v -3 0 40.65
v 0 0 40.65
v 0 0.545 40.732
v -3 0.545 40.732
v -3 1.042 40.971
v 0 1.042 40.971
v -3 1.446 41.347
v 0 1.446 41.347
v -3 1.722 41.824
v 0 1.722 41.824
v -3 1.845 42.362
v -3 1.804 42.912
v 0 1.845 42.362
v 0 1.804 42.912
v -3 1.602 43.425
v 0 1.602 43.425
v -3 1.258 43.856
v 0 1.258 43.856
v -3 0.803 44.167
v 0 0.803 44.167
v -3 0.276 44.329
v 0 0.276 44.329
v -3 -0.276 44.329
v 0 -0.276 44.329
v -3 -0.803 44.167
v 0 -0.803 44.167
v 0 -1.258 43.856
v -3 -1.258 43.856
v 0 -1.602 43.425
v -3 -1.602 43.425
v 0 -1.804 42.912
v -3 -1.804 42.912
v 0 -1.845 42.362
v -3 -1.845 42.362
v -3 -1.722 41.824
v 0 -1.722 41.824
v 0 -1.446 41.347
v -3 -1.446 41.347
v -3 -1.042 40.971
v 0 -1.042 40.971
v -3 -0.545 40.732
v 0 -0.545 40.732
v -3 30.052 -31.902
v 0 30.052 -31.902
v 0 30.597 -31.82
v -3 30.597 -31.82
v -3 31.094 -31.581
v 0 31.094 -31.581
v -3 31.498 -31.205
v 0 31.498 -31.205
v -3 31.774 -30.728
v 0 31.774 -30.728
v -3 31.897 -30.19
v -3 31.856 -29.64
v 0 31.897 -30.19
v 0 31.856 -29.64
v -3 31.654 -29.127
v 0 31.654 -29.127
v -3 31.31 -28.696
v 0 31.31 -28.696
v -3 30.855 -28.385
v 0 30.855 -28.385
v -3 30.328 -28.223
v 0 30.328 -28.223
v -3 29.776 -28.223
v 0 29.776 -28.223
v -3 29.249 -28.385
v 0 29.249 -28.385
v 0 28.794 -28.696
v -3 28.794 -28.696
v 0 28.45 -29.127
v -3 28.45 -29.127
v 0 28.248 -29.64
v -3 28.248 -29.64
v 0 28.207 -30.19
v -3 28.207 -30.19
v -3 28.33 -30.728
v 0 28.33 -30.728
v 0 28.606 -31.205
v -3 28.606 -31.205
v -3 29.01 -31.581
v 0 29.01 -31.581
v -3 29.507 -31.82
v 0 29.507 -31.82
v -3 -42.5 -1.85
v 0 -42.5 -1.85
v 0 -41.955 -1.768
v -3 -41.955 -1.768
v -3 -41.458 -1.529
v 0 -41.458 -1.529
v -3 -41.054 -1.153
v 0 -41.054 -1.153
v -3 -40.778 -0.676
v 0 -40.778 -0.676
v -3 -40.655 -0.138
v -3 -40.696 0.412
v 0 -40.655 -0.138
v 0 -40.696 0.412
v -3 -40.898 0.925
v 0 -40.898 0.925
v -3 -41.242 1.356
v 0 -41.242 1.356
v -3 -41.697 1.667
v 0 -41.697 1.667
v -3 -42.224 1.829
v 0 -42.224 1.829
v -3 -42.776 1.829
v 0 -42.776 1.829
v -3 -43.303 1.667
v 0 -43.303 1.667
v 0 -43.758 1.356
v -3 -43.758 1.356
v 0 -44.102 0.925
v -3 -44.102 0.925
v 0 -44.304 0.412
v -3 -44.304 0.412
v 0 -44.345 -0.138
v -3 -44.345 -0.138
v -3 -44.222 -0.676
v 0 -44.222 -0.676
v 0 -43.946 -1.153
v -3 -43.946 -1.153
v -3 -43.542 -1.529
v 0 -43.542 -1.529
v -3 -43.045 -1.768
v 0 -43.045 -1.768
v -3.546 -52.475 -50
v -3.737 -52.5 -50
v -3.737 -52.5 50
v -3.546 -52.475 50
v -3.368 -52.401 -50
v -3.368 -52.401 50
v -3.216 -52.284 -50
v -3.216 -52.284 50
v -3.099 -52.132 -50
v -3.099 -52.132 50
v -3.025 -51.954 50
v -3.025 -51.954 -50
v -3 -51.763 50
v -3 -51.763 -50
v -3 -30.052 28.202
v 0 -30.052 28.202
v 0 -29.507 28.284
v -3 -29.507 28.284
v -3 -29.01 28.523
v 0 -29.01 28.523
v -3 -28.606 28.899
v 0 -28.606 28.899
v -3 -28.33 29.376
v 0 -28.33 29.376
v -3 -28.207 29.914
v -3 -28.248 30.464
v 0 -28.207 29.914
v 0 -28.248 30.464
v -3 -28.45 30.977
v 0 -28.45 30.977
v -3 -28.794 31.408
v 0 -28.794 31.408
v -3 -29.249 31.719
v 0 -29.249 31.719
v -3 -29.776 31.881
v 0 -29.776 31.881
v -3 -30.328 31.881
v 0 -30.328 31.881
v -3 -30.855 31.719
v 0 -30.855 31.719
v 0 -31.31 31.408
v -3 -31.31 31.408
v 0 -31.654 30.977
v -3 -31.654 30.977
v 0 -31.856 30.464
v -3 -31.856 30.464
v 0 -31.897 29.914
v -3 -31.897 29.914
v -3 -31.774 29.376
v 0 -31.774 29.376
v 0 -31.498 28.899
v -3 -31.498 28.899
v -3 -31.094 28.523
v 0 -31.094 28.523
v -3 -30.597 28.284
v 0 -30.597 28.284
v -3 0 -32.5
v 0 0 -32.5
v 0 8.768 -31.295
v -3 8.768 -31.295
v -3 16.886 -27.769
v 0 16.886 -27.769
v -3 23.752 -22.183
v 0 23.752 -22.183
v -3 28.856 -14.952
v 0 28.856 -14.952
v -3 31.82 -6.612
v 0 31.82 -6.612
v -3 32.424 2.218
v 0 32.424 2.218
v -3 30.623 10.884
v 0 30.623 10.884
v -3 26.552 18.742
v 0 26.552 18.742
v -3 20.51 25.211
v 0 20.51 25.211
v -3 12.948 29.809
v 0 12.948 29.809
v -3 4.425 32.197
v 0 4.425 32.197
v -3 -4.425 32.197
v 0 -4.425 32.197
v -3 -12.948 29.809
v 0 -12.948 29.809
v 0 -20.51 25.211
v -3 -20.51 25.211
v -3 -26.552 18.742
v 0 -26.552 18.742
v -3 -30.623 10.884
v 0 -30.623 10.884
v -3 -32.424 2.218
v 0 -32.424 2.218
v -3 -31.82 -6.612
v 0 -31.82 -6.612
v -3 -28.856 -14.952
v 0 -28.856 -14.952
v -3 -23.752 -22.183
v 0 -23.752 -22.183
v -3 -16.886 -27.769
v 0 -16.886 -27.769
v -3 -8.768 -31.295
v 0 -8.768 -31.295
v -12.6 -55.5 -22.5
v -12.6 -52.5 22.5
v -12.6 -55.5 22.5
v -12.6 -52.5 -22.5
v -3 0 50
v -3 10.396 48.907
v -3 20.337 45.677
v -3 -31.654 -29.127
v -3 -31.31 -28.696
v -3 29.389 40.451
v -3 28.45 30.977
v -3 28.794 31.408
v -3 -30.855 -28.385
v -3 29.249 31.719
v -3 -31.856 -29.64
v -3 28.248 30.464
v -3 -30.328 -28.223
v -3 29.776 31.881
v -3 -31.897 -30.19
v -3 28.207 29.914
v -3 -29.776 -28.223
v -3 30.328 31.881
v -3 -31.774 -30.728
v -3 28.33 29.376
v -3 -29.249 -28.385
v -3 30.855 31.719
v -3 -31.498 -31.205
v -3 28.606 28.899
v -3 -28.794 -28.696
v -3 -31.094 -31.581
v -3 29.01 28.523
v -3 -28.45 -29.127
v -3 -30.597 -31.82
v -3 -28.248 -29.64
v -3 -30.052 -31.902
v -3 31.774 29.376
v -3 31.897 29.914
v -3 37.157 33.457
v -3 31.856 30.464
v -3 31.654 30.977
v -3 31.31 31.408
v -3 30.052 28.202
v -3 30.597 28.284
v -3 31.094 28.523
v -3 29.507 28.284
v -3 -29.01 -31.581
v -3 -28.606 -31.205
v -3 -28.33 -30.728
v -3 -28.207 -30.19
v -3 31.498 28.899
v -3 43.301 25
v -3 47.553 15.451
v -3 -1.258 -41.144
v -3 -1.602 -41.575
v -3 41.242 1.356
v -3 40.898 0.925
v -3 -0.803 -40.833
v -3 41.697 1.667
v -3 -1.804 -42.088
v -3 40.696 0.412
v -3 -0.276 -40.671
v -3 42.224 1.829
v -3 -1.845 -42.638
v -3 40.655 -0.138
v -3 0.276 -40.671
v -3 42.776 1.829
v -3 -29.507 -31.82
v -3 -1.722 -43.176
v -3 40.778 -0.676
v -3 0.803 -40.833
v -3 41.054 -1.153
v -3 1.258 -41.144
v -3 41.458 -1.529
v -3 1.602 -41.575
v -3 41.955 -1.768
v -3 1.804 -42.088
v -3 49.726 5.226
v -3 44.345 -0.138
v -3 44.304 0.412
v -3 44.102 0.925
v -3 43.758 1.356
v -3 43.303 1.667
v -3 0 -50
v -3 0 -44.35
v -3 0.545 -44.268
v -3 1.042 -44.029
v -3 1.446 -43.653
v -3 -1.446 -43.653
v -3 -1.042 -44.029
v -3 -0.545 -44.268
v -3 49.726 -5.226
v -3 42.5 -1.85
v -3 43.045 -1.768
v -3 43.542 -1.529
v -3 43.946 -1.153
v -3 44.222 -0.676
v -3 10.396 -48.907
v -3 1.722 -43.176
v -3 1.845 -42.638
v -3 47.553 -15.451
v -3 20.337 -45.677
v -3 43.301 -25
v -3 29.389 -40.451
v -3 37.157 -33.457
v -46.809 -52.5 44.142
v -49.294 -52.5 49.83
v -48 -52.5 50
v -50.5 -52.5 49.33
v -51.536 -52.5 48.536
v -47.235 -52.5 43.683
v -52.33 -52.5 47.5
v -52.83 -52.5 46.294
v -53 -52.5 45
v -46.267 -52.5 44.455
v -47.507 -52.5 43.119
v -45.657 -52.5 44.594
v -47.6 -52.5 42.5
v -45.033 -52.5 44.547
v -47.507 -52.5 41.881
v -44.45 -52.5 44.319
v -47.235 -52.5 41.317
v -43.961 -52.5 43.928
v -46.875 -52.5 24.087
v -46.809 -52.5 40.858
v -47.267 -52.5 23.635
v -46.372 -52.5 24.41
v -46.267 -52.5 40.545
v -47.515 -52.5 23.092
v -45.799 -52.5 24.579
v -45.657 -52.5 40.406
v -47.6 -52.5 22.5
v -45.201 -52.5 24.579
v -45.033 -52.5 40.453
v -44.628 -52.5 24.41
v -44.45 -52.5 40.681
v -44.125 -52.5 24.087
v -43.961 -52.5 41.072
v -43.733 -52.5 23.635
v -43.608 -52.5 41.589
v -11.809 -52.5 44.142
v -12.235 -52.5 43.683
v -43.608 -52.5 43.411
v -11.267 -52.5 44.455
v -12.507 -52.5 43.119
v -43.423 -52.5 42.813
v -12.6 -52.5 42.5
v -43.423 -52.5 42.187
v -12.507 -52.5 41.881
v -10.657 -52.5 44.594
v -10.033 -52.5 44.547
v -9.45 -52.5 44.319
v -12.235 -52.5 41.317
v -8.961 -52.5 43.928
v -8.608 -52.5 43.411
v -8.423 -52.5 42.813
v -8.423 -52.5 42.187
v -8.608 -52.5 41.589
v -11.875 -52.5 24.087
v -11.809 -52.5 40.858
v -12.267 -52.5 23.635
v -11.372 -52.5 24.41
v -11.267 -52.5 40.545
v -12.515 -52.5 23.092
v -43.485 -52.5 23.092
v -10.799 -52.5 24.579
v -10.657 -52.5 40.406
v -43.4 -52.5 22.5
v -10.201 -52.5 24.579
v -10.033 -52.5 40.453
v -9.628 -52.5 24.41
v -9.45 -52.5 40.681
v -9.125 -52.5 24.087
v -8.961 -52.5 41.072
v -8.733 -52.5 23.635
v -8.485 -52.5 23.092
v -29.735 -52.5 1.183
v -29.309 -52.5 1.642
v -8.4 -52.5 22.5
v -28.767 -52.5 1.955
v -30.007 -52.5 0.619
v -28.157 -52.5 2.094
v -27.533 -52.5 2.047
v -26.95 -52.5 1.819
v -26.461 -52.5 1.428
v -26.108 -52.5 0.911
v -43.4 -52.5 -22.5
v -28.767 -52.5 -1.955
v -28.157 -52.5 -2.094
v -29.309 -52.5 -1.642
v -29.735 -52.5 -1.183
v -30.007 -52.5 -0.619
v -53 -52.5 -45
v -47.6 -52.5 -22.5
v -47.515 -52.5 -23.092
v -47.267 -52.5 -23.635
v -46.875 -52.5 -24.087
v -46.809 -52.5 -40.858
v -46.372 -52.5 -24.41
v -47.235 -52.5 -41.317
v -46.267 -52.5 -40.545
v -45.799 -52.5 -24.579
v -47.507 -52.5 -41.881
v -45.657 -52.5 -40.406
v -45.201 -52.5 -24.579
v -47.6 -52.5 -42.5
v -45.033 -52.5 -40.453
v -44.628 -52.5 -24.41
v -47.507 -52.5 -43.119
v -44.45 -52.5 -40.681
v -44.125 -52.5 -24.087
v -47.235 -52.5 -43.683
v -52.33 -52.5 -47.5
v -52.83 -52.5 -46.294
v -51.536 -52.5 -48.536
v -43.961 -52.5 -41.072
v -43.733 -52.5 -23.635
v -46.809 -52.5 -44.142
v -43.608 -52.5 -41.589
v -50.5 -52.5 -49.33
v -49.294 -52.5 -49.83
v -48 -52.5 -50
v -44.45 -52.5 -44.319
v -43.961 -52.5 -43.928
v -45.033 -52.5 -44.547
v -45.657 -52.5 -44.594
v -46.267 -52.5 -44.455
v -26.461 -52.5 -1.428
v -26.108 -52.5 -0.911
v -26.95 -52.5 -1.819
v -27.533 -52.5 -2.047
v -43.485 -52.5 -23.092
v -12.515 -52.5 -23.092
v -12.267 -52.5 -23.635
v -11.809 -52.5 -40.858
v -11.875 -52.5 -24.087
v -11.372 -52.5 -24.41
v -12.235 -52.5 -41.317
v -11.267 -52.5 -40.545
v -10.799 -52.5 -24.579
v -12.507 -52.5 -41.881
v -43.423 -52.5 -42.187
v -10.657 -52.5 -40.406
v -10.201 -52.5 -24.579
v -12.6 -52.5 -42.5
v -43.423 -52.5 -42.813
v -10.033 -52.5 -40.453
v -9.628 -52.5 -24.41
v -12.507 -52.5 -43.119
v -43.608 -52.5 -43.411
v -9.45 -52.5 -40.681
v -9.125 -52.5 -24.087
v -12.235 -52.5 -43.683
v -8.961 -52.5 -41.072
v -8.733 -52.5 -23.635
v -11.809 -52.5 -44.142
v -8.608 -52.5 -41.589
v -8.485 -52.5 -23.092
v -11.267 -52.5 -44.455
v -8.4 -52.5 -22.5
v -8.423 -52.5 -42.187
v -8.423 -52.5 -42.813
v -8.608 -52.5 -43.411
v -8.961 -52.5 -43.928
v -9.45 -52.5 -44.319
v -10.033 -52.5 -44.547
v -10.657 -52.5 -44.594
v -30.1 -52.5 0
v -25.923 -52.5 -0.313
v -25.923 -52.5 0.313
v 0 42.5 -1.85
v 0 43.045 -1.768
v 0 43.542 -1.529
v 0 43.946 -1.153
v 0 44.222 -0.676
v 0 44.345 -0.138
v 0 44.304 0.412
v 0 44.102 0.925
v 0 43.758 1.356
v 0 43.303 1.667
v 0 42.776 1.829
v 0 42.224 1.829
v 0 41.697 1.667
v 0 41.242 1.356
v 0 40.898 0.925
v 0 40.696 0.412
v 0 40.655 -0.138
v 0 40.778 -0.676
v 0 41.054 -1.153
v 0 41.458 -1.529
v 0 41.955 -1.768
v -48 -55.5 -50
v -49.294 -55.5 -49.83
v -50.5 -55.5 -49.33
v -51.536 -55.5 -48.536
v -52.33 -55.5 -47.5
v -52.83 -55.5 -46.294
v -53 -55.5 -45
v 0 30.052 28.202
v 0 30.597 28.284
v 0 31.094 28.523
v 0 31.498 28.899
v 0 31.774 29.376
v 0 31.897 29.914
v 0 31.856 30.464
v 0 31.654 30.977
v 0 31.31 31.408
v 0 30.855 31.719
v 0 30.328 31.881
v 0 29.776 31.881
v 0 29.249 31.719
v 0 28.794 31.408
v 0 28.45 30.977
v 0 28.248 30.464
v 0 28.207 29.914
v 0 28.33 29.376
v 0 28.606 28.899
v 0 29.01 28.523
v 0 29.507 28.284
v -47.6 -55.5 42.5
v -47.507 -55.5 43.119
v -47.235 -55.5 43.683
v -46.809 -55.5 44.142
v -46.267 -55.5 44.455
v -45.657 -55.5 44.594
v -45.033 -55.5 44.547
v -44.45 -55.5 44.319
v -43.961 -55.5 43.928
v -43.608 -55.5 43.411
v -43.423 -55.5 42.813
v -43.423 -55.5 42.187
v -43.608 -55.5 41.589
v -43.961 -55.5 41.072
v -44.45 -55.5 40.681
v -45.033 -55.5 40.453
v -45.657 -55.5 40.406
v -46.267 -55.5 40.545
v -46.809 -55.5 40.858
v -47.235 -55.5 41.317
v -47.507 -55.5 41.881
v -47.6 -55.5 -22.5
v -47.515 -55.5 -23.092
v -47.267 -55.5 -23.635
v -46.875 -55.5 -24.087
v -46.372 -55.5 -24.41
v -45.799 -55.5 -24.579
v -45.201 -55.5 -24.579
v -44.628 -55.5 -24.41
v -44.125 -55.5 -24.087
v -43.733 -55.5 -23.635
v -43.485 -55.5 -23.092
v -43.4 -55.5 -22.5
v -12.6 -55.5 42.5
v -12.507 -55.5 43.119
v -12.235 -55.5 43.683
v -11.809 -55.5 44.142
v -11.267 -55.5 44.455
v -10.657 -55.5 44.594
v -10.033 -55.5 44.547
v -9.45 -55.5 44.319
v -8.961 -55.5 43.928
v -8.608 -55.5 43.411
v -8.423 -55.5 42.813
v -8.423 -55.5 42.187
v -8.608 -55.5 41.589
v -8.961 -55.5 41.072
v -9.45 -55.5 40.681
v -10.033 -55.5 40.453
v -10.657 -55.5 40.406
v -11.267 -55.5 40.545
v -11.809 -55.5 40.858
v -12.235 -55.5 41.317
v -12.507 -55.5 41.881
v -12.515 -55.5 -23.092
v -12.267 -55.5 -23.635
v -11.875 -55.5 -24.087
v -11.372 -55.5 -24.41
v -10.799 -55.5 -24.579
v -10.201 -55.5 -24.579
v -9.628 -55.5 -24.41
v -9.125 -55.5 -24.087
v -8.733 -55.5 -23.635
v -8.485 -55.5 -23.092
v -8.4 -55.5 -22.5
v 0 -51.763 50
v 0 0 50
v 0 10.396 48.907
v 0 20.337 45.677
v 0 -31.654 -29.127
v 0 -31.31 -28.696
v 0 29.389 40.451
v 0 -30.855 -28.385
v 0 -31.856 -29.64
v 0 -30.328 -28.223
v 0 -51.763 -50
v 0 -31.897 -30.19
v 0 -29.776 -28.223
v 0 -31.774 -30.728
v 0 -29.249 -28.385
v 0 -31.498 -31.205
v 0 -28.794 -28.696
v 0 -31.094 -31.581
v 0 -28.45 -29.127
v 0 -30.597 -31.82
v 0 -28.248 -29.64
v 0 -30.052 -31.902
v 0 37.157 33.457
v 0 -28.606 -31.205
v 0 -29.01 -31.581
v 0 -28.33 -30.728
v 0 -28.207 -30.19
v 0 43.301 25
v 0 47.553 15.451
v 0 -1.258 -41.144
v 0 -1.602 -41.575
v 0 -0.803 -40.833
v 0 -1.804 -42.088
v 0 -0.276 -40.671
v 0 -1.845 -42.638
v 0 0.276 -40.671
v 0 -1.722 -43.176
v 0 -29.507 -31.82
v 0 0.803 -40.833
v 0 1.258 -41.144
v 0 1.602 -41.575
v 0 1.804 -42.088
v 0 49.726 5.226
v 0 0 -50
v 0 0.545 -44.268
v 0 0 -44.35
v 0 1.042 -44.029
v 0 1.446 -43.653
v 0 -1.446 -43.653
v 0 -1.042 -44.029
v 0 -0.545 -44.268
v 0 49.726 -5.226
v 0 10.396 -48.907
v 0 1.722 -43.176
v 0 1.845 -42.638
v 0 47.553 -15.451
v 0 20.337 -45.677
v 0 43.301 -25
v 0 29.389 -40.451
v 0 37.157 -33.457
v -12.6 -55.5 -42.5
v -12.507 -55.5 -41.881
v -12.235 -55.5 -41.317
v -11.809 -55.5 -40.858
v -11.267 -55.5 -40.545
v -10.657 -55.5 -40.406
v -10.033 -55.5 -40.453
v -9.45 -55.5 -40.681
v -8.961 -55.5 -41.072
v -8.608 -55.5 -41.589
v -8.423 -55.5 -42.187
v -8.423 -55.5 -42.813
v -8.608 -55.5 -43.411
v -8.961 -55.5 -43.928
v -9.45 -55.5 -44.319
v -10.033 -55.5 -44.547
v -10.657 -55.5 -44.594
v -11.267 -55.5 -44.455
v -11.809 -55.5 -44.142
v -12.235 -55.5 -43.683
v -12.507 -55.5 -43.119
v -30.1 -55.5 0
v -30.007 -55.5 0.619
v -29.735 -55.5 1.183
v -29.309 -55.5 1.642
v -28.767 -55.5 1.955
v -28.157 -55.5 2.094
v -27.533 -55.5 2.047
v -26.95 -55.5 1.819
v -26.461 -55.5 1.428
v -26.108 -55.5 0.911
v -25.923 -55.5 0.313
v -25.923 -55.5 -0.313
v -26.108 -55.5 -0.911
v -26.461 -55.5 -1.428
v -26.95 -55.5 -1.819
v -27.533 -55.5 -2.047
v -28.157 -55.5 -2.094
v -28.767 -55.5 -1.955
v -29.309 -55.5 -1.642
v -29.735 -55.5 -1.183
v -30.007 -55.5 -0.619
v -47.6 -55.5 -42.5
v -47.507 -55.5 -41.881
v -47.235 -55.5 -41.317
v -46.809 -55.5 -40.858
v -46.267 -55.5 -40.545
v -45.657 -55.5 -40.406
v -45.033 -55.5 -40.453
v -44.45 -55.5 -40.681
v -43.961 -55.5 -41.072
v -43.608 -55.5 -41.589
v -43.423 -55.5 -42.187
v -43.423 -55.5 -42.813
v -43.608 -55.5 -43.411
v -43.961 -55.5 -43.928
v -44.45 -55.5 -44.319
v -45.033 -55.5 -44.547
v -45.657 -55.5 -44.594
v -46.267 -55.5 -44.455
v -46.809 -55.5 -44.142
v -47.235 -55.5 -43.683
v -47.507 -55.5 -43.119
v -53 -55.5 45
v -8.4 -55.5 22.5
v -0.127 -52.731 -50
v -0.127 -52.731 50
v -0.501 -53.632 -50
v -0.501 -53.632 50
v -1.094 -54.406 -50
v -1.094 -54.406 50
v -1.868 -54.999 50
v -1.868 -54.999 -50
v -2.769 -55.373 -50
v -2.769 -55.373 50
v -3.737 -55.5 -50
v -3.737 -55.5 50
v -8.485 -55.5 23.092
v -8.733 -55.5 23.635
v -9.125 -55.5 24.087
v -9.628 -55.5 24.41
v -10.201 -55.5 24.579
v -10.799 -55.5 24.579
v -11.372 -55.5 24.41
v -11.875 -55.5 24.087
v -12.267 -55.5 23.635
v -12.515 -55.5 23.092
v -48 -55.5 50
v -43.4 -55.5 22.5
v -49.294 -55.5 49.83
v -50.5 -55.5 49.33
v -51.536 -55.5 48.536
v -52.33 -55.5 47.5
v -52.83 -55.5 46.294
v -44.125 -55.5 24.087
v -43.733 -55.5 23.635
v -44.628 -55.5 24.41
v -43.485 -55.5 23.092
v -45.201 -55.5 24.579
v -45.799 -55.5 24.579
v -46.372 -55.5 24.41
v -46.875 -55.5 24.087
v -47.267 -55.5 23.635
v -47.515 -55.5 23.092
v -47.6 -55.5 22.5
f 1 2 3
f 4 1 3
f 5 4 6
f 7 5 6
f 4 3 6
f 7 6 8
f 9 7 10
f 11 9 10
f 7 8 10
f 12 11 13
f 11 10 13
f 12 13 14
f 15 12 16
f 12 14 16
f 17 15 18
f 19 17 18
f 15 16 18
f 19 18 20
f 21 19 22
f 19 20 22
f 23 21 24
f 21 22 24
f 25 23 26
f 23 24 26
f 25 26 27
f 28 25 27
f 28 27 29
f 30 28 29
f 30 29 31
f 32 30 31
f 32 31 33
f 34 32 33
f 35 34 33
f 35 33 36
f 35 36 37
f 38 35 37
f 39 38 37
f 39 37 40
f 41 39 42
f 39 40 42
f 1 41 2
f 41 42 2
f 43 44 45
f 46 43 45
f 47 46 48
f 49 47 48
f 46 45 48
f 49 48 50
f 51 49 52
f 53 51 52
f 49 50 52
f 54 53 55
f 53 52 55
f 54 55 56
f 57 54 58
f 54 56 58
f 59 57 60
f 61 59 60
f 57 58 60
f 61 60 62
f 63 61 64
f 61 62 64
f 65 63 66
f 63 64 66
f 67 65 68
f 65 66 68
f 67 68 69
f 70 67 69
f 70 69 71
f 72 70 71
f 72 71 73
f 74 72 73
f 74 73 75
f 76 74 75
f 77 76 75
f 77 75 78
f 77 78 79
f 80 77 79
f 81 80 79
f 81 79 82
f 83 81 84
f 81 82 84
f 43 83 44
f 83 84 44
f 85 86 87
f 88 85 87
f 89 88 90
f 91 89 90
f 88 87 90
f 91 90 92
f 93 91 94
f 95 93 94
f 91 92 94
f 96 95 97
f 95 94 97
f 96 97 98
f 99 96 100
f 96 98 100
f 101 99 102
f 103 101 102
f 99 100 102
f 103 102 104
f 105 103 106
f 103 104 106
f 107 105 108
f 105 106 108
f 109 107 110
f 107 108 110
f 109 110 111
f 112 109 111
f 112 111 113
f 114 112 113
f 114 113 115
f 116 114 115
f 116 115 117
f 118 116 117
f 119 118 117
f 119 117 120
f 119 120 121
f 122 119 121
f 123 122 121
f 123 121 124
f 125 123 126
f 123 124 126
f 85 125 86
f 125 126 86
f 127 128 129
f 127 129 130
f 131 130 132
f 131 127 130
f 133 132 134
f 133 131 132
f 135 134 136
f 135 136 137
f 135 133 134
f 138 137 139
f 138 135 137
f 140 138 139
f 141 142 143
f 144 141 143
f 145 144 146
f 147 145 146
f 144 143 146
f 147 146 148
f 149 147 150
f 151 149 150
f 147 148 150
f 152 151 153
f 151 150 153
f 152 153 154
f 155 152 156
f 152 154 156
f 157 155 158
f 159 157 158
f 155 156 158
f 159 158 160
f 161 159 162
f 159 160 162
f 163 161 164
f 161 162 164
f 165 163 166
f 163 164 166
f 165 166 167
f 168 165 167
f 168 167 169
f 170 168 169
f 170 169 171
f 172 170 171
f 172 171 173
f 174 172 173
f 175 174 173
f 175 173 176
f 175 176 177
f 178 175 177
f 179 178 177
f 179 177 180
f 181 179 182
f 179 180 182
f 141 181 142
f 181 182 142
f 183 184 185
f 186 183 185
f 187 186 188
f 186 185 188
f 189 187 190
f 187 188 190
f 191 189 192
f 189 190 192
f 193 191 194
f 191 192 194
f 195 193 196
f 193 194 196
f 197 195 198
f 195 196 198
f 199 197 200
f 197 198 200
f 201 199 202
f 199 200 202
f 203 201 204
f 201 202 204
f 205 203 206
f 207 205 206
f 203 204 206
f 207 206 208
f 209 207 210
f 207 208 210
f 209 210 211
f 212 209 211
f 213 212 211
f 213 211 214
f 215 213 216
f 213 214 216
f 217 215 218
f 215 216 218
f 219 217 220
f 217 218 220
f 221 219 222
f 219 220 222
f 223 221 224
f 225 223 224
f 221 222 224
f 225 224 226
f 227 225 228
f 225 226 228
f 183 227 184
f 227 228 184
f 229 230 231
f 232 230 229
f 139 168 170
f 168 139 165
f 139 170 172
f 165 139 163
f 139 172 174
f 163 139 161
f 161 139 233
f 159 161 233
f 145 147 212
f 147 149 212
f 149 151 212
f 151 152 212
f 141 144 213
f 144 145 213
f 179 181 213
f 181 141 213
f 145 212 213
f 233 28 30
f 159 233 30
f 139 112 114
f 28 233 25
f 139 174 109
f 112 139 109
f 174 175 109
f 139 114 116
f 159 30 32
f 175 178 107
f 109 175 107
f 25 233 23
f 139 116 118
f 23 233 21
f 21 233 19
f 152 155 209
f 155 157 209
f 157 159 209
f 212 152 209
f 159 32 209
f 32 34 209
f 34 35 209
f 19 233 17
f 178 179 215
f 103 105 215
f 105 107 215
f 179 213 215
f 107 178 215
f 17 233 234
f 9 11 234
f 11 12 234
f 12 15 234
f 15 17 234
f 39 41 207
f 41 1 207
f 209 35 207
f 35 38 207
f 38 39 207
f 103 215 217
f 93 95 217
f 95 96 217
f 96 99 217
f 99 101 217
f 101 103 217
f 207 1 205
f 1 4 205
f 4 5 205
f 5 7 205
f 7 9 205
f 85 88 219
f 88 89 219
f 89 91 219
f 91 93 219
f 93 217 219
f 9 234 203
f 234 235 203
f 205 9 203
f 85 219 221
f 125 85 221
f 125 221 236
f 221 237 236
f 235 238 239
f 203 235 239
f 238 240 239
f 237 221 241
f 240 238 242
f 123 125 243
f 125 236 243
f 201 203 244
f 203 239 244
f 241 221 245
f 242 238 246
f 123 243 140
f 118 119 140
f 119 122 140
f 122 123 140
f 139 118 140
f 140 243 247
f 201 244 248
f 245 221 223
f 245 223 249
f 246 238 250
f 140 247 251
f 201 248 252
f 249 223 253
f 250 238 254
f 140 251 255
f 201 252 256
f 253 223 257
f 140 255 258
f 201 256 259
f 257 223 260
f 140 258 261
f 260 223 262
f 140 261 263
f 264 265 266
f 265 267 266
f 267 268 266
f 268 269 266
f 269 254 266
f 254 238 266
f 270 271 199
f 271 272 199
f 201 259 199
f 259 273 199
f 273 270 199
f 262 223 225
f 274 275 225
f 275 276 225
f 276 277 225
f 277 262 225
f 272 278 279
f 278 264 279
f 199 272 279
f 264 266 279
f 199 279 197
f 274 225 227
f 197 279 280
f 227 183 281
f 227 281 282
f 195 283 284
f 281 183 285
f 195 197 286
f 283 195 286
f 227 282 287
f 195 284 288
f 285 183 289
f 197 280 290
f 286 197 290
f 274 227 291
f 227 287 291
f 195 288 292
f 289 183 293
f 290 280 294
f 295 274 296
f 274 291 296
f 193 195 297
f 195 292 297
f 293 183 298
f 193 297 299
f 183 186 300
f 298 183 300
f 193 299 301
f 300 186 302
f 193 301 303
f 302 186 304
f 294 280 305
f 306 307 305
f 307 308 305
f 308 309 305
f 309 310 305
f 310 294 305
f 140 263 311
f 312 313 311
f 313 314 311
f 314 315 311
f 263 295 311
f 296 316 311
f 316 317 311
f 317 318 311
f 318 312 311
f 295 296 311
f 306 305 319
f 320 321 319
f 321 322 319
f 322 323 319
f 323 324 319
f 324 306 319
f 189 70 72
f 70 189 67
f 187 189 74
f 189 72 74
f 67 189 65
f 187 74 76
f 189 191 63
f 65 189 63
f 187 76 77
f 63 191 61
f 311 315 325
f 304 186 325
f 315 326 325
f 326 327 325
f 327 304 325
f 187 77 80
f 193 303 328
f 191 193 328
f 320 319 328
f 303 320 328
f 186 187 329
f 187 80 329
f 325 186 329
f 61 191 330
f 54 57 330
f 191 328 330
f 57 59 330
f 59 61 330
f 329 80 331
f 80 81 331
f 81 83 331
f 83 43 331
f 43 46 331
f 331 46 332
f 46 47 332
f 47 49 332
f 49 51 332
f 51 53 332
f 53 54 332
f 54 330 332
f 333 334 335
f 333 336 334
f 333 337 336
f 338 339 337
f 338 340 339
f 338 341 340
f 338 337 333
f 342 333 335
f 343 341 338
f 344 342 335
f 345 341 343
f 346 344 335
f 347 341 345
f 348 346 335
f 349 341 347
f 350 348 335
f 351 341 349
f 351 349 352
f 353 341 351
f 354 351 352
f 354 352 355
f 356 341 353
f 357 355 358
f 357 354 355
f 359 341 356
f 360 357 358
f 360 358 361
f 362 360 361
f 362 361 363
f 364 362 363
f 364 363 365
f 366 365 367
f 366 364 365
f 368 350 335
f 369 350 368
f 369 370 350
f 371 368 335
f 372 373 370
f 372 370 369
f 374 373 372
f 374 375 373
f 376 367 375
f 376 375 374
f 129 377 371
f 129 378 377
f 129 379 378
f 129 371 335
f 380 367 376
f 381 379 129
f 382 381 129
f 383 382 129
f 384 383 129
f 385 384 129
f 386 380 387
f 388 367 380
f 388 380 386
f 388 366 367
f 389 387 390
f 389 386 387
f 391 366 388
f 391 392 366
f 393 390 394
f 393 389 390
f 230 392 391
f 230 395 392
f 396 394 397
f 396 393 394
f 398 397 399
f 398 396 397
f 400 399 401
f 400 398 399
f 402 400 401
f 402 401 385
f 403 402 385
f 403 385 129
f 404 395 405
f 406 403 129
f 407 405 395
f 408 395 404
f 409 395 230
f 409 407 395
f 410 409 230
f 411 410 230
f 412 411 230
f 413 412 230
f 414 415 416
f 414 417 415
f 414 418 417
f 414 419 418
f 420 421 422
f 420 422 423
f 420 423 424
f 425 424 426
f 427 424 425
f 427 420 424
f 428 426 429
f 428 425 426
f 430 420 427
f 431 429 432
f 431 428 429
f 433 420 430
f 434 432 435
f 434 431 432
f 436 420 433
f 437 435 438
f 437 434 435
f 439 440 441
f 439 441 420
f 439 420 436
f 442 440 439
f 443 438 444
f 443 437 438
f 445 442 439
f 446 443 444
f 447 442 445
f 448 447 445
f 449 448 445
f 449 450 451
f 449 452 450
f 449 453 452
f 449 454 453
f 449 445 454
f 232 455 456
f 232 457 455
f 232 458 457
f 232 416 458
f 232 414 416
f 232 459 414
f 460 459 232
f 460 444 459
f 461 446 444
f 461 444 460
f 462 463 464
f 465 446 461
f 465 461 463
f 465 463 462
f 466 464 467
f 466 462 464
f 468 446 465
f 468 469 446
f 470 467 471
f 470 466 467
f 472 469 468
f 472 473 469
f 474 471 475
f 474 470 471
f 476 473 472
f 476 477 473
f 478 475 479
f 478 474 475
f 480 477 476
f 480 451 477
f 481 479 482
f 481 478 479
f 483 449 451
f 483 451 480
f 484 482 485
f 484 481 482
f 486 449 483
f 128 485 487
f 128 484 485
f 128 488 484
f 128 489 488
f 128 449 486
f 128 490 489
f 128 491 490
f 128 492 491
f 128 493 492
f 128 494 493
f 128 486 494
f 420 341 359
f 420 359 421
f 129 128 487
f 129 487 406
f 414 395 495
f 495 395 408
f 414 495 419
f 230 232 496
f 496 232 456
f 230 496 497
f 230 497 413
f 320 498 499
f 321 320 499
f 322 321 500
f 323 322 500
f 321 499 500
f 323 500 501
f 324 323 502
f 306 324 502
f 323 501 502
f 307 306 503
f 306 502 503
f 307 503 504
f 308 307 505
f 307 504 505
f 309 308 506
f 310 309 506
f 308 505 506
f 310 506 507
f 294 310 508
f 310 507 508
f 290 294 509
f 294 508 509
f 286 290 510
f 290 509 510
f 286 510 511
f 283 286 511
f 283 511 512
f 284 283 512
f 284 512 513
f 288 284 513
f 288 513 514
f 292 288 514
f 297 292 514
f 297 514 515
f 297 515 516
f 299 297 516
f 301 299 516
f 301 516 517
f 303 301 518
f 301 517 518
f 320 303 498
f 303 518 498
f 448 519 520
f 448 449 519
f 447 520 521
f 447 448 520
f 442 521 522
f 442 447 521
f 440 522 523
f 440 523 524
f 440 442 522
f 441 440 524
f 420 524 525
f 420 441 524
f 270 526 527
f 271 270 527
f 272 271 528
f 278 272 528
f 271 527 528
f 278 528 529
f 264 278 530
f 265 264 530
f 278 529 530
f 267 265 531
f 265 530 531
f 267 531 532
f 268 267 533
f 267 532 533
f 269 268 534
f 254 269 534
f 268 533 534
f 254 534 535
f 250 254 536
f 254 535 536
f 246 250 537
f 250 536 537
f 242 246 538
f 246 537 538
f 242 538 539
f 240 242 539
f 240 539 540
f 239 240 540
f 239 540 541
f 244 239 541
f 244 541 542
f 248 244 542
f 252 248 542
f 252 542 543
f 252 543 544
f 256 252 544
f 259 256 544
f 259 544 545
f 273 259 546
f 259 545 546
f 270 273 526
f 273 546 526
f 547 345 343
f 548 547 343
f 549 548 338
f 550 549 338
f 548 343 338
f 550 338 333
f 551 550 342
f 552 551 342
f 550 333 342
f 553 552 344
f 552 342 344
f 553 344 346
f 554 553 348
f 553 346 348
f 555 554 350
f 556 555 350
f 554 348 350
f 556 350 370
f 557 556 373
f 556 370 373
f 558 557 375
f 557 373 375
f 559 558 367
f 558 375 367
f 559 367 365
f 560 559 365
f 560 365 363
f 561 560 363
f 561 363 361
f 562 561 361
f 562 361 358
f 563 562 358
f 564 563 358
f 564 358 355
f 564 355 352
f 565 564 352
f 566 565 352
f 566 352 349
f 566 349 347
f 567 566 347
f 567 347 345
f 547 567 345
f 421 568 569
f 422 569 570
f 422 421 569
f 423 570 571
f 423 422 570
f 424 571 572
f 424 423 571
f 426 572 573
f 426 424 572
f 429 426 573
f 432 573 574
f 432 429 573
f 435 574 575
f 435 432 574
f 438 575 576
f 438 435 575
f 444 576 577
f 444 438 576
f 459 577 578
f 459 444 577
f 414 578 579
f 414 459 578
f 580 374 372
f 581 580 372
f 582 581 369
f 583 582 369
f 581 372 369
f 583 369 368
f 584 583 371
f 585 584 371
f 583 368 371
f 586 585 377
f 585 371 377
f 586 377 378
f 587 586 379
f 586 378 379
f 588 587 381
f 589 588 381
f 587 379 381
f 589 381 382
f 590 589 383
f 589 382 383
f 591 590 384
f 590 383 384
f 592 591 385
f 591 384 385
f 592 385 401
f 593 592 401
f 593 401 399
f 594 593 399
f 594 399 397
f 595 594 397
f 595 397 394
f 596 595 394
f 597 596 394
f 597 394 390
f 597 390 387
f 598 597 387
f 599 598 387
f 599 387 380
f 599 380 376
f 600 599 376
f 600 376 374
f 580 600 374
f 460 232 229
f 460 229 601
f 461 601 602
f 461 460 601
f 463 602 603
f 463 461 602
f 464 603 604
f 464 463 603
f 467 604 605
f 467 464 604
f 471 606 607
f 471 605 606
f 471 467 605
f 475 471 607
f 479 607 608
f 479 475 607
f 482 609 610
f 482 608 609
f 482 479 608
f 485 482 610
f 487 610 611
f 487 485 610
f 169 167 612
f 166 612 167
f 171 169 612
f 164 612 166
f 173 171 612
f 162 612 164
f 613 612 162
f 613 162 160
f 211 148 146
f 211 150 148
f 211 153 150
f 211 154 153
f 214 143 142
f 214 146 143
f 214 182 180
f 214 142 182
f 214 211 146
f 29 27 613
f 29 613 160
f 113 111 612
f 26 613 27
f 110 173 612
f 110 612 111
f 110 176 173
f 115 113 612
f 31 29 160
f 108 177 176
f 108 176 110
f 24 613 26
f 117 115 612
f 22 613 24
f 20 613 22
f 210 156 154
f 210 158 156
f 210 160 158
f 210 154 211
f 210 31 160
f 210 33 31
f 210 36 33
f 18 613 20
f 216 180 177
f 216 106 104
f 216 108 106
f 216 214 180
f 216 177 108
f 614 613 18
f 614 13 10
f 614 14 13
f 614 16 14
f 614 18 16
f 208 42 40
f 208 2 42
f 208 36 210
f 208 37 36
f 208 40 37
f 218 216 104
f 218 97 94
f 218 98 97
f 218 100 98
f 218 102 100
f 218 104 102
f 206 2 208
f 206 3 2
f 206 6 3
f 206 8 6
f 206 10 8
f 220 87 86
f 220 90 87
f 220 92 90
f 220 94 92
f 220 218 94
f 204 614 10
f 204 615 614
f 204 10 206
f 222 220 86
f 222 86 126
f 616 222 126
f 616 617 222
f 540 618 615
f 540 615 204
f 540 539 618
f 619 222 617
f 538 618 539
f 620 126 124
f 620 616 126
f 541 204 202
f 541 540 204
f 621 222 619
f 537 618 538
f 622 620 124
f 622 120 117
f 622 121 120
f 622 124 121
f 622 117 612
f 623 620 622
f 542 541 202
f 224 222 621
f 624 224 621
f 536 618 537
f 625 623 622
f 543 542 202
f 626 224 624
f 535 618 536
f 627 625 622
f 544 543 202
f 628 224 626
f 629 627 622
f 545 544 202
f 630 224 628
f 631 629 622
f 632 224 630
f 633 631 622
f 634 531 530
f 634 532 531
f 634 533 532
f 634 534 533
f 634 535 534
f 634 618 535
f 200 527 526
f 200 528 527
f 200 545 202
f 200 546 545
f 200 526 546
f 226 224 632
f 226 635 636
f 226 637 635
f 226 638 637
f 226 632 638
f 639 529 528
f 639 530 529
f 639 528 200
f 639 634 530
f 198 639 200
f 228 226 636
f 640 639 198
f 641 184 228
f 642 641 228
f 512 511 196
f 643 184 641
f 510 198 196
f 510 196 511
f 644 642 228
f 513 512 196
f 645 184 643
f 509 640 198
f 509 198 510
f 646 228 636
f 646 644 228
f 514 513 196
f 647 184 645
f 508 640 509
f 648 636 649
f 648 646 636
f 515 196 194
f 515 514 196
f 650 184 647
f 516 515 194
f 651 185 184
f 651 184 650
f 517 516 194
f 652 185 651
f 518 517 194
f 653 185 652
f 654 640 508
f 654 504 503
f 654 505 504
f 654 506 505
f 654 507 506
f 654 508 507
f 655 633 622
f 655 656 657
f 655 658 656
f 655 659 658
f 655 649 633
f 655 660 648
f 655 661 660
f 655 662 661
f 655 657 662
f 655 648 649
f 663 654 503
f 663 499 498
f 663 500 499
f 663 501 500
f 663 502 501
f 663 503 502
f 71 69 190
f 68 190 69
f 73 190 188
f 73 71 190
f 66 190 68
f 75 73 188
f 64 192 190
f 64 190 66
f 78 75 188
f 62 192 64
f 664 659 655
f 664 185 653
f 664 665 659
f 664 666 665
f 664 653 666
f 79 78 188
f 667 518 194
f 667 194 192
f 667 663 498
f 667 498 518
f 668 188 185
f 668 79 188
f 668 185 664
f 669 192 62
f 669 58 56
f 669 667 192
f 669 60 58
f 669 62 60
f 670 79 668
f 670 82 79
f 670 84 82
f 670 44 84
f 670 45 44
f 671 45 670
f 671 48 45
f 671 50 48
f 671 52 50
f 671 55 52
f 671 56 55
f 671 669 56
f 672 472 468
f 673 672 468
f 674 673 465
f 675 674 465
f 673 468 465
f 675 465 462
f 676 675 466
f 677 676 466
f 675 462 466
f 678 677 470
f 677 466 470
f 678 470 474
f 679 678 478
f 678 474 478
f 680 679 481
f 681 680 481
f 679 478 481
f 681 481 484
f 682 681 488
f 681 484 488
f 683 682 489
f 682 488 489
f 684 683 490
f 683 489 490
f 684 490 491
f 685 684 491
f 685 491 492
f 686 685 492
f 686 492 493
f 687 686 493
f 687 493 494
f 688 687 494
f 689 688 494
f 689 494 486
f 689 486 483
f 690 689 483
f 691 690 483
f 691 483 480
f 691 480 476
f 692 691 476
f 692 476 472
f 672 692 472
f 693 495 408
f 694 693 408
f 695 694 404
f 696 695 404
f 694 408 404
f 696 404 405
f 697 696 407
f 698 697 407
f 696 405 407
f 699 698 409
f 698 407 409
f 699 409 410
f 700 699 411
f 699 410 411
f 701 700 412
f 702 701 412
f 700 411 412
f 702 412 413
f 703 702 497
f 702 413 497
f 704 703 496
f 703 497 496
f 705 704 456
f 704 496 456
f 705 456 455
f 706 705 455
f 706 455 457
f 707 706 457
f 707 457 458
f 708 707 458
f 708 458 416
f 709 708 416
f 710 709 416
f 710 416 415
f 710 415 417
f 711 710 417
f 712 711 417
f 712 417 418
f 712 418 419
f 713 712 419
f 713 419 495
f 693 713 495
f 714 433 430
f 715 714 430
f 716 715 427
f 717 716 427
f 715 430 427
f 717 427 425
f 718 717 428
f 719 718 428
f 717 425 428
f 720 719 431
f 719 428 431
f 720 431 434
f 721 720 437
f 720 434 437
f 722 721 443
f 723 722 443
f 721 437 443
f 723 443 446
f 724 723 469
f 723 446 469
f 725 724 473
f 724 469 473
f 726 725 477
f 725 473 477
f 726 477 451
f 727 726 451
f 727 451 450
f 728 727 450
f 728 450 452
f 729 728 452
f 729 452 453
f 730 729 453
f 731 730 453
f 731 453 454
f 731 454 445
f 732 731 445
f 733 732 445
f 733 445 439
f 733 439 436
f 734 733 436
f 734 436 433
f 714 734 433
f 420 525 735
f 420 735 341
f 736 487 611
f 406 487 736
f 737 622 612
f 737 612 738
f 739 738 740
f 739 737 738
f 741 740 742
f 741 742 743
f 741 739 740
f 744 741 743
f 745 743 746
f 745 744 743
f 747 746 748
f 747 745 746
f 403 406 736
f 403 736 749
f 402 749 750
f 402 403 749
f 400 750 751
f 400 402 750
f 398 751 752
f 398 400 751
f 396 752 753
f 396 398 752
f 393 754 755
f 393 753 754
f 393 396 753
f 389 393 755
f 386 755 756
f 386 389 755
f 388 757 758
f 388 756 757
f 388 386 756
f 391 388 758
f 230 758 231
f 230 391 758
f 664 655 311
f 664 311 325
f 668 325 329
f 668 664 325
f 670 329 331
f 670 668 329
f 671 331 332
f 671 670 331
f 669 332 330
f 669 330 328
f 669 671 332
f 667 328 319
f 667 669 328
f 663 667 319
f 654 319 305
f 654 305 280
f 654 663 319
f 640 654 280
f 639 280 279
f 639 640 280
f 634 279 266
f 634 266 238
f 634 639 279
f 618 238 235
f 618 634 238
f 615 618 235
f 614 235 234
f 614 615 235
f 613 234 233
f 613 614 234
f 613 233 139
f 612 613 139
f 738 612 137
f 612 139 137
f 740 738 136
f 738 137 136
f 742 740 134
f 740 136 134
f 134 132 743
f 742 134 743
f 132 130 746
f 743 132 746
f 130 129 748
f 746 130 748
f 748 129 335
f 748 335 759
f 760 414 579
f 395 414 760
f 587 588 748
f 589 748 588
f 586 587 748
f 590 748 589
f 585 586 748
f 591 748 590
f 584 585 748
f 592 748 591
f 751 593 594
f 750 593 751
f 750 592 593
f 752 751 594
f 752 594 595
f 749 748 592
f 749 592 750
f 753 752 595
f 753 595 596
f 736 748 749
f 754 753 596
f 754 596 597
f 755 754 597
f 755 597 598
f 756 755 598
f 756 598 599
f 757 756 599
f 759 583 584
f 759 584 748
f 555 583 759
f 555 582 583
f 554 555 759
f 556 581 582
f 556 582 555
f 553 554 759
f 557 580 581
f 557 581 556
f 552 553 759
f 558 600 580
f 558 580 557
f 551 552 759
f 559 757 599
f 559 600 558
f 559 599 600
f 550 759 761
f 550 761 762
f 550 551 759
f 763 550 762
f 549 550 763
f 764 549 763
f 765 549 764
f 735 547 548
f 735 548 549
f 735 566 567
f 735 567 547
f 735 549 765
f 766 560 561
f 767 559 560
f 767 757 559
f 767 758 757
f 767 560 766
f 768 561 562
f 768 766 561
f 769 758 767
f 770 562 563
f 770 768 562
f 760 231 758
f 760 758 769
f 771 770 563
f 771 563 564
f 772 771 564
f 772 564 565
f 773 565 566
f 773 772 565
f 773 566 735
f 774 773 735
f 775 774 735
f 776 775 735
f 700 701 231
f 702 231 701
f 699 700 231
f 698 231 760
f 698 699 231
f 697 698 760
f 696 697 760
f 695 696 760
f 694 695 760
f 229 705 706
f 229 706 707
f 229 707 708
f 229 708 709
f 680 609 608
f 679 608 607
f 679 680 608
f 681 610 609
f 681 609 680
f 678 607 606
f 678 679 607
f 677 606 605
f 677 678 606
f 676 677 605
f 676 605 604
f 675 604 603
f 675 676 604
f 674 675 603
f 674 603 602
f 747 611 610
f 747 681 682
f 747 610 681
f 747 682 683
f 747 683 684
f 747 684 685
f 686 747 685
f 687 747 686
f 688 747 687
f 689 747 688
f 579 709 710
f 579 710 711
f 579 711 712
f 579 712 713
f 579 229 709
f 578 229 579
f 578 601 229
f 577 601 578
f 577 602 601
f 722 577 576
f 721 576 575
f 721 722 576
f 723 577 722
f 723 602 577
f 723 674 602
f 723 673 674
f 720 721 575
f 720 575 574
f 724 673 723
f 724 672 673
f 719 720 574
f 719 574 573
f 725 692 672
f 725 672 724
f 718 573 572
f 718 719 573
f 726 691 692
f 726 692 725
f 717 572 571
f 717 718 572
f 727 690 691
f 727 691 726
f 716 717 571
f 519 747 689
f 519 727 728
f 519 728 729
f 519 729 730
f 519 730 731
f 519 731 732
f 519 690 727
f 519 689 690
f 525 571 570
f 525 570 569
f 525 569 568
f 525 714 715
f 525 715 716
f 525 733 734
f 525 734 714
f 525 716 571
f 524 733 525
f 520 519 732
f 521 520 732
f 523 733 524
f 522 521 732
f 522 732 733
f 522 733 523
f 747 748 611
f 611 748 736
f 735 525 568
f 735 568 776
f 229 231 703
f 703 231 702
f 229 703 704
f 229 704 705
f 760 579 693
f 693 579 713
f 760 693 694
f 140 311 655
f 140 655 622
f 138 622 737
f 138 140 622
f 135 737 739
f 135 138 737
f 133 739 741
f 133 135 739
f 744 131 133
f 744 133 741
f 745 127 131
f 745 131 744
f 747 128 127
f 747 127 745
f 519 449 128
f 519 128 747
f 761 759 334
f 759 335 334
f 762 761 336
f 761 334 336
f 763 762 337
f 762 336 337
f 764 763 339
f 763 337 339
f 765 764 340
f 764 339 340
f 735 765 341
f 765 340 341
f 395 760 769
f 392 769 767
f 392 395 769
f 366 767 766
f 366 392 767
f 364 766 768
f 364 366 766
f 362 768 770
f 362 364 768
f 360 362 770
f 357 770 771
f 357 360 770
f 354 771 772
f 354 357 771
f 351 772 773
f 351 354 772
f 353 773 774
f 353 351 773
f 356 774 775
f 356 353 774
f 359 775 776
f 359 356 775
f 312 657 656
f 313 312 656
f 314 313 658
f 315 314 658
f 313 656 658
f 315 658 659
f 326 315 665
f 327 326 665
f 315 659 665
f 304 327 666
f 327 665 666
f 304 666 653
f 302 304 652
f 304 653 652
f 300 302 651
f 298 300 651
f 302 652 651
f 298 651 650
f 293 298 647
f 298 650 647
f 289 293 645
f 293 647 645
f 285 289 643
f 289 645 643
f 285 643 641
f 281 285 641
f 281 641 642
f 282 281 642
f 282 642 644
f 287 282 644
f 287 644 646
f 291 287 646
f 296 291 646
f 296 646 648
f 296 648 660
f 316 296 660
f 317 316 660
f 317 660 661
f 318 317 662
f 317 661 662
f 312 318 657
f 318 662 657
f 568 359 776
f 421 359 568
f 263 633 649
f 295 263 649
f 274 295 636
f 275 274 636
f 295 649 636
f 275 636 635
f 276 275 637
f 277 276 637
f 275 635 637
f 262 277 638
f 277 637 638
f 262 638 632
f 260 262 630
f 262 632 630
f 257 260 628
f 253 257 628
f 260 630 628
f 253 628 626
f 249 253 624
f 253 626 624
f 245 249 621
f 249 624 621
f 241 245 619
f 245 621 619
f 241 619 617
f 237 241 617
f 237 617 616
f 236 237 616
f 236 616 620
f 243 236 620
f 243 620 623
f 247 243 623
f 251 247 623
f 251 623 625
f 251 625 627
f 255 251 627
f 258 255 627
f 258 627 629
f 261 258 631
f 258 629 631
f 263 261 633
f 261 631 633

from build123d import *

# Parameters (mm, degrees)
SKETCH_1_R                       = 1.85
SKETCH_1_R_2                     = 32.5
SM_BASE_FLANGE_1_DEPTH           = 3
SM_EDGE_FLANGE_1_STRIP_W         = 13.4732
SM_EDGE_FLANGE_1_STRIP_H         = 3
SM_EDGE_FLANGE_1_STRIP_CUT_DEPTH = 100
SM_EDGE_FLANGE_1_DEPTH           = 100
SKETCH_9_R                       = 2.1
CUT_EXTRUDE_1_DEPTH              = 10
FILLET_1_R                       = 5
SKETCH_10_R                      = 2.1
CUT_EXTRUDE_2_DEPTH              = 10


# Sheet-metal steps are written as plain solids
with BuildPart() as part:
    # Sketch 1 → 基体-法兰1 (new body)
    with BuildSketch(Plane(origin=(0, 0, 0), x_dir=(0, 0, -1), z_dir=(1, 0, 0))):
        with BuildLine():
            Line((-50, 0), (-50, -55.5))
            Line((-50, -55.5), (50, -55.5))
            Line((50, -55.5), (50, 0))
            ThreePointArc((50, 0), (0, 50), (-50, 0))
        make_face()
        with Locations((0, 42.5)):
            Circle(SKETCH_1_R, mode=Mode.SUBTRACT)
        with Locations((30.0520382, 30.0520382)):
            Circle(SKETCH_1_R, mode=Mode.SUBTRACT)
        with Locations((42.5, 0)):
            Circle(SKETCH_1_R, mode=Mode.SUBTRACT)
        with Locations((30.0520382, -30.0520382)):
            Circle(SKETCH_1_R, mode=Mode.SUBTRACT)
        with Locations((0, -42.5)):
            Circle(SKETCH_1_R, mode=Mode.SUBTRACT)
        with Locations((-30.0520382, -30.0520382)):
            Circle(SKETCH_1_R, mode=Mode.SUBTRACT)
        with Locations((-42.5, 0)):
            Circle(SKETCH_1_R, mode=Mode.SUBTRACT)
        with Locations((-30.0520382, 30.0520382)):
            Circle(SKETCH_1_R, mode=Mode.SUBTRACT)
        Circle(SKETCH_1_R_2, mode=Mode.SUBTRACT)
    extrude(amount=-SM_BASE_FLANGE_1_DEPTH)

    # 边线-法兰1 strip (across the edge) → 边线-法兰1 strip cut (cut)
    with BuildSketch(Plane(origin=(-3, -55.5, -50), x_dir=(0, 1, 0), z_dir=(0, 0, 1))):
        with Locations((-3, -1.5)):
            Rectangle(SM_EDGE_FLANGE_1_STRIP_W, SM_EDGE_FLANGE_1_STRIP_H)
    extrude(amount=SM_EDGE_FLANGE_1_STRIP_CUT_DEPTH, mode=Mode.SUBTRACT)

    # 边线-法兰1 section (across the edge) → 边线-法兰1 (add)
    with BuildSketch(Plane(origin=(-3, -55.5, -50), x_dir=(0, 1, 0), z_dir=(0, 0, 1))):
        with BuildLine():
            Line((0, 0.7366), (0, 50))
            Line((0, 50), (3, 50))
            Line((3, 50), (3, 0.7366))
            ThreePointArc((3, 0.7366), (3.215745145, 0.215745145), (3.7366, 0))
            Line((3.7366, 0), (3.7366, -3))
            ThreePointArc((3.7366, -3), (1.094424801, -1.905575199), (0, 0.7366))
        make_face()
    extrude(amount=SM_EDGE_FLANGE_1_DEPTH)

    # 草图9 → 切除-拉伸1 (cut)
    with BuildSketch(Plane(origin=(0, -52.5, 0), x_dir=(1, 0, 0), z_dir=(0, 1, 0))):
        with Locations(Location((-45.5, 42.5, 0), (0, 0, 180))):
            Circle(SKETCH_9_R)
        with Locations(Location((-10.5, 42.5, 0), (0, 0, 180))):
            Circle(SKETCH_9_R)
        with Locations(Location((-45.5, -42.5, 0), (0, 0, 180))):
            Circle(SKETCH_9_R)
        with Locations(Location((-10.5, -42.5, 0), (0, 0, 180))):
            Circle(SKETCH_9_R)
    extrude(amount=-CUT_EXTRUDE_1_DEPTH, mode=Mode.SUBTRACT)

    # 圆角1
    fillet_1_edges = [part.edges().sort_by_distance(p)[0] for p in [
        (-53, -54, -50),
        (-53, -54, 50),
    ]]
    fillet(fillet_1_edges, radius=FILLET_1_R)

    # 草图10 → 切除-拉伸2 (cut)
    with BuildSketch(Plane(origin=(0, -52.5, 0), x_dir=(1, 0, 0), z_dir=(0, 1, 0))):
        with Locations(Location((-28, 0, 0), (0, 0, 180))):
            Circle(SKETCH_10_R)
        with BuildLine():
            Line((-43.4, 22.5), (-43.4, -22.5))
            ThreePointArc((-43.4, -22.5), (-45.5, -24.6), (-47.6, -22.5))
            Line((-47.6, -22.5), (-47.6, 22.5))
            ThreePointArc((-47.6, 22.5), (-45.5, 24.6), (-43.4, 22.5))
        make_face()
        with BuildLine():
            Line((-8.4, 22.5), (-8.4, -22.5))
            ThreePointArc((-8.4, -22.5), (-10.5, -24.6), (-12.6, -22.5))
            Line((-12.6, -22.5), (-12.6, 22.5))
            ThreePointArc((-12.6, 22.5), (-10.5, 24.6), (-8.4, 22.5))
        make_face()
    extrude(amount=-CUT_EXTRUDE_2_DEPTH, mode=Mode.SUBTRACT)


solid = part.part
